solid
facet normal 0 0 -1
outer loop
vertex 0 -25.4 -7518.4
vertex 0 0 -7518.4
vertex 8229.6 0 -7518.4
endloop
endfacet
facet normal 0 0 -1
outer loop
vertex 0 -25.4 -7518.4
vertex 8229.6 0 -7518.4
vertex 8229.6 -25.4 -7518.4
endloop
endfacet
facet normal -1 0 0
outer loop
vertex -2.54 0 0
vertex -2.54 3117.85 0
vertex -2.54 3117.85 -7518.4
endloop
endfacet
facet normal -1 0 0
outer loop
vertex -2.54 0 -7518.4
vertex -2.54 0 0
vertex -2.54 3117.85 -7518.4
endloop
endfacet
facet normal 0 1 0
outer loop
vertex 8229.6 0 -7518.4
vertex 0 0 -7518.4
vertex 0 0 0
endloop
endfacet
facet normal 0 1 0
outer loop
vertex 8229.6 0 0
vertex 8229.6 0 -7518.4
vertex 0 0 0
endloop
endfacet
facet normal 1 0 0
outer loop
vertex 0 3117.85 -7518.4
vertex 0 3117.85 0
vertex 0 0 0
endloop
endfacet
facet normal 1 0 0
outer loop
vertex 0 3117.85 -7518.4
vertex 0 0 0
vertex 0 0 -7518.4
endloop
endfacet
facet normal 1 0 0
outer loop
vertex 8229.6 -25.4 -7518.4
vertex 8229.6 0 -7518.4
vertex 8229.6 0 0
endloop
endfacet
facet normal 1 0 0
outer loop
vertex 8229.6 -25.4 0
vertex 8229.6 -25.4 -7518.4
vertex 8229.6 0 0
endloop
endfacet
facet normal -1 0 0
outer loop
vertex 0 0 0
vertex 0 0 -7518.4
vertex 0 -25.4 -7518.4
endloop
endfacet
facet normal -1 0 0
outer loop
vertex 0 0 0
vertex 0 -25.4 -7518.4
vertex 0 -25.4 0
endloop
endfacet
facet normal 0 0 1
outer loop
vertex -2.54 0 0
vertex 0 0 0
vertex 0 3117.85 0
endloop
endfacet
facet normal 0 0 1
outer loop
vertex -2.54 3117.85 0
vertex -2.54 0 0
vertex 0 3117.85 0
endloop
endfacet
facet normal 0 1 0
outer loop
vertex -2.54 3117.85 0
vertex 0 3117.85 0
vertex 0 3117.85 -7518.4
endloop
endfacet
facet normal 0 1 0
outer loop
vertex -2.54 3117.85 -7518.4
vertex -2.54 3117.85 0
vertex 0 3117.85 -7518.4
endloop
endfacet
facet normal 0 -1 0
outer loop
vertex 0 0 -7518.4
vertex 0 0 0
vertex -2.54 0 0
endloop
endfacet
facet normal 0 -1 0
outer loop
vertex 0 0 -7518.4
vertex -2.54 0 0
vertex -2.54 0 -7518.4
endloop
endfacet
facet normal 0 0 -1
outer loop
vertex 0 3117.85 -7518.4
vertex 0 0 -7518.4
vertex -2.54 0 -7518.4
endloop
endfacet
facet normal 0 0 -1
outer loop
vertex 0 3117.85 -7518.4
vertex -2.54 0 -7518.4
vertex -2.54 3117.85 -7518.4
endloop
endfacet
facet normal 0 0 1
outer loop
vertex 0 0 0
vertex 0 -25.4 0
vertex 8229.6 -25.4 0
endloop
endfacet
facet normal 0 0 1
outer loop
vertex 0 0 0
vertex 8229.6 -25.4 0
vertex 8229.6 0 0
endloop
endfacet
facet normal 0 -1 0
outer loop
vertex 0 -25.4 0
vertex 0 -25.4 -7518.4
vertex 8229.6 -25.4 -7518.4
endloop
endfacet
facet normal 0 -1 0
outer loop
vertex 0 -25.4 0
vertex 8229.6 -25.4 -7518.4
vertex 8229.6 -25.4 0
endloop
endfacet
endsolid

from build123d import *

# Parameters (mm, degrees)
EXTRUDE3_DEPTH = 8229.6
SKETCH6_W      = 7518.4
SKETCH6_H      = 3117.85
EXTRUDE5_DEPTH = 2.54


with BuildPart() as part:
    # Sketch4 → Extrude3 (new body)
    with BuildSketch(Plane(origin=(0, 0, 0), x_dir=(0, 0, -1), z_dir=(1, 0, 0))):
        Polygon((0, 0), (838.2, 0), (6680.2, 0), (7518.4, 0), (7518.4, -25.4), (0, -25.4), align=None)
    extrude(amount=EXTRUDE3_DEPTH)


with BuildPart() as body_2:
    # Sketch6 → Extrude5 (new body)
    with BuildSketch(Plane(origin=(0, 0, 0), x_dir=(0, 0, -1), z_dir=(1, 0, 0))):
        with Locations((3759.2, 1558.925)):
            Rectangle(SKETCH6_W, SKETCH6_H)
    extrude(amount=-EXTRUDE5_DEPTH)


solid = Compound([part.part, body_2.part])
